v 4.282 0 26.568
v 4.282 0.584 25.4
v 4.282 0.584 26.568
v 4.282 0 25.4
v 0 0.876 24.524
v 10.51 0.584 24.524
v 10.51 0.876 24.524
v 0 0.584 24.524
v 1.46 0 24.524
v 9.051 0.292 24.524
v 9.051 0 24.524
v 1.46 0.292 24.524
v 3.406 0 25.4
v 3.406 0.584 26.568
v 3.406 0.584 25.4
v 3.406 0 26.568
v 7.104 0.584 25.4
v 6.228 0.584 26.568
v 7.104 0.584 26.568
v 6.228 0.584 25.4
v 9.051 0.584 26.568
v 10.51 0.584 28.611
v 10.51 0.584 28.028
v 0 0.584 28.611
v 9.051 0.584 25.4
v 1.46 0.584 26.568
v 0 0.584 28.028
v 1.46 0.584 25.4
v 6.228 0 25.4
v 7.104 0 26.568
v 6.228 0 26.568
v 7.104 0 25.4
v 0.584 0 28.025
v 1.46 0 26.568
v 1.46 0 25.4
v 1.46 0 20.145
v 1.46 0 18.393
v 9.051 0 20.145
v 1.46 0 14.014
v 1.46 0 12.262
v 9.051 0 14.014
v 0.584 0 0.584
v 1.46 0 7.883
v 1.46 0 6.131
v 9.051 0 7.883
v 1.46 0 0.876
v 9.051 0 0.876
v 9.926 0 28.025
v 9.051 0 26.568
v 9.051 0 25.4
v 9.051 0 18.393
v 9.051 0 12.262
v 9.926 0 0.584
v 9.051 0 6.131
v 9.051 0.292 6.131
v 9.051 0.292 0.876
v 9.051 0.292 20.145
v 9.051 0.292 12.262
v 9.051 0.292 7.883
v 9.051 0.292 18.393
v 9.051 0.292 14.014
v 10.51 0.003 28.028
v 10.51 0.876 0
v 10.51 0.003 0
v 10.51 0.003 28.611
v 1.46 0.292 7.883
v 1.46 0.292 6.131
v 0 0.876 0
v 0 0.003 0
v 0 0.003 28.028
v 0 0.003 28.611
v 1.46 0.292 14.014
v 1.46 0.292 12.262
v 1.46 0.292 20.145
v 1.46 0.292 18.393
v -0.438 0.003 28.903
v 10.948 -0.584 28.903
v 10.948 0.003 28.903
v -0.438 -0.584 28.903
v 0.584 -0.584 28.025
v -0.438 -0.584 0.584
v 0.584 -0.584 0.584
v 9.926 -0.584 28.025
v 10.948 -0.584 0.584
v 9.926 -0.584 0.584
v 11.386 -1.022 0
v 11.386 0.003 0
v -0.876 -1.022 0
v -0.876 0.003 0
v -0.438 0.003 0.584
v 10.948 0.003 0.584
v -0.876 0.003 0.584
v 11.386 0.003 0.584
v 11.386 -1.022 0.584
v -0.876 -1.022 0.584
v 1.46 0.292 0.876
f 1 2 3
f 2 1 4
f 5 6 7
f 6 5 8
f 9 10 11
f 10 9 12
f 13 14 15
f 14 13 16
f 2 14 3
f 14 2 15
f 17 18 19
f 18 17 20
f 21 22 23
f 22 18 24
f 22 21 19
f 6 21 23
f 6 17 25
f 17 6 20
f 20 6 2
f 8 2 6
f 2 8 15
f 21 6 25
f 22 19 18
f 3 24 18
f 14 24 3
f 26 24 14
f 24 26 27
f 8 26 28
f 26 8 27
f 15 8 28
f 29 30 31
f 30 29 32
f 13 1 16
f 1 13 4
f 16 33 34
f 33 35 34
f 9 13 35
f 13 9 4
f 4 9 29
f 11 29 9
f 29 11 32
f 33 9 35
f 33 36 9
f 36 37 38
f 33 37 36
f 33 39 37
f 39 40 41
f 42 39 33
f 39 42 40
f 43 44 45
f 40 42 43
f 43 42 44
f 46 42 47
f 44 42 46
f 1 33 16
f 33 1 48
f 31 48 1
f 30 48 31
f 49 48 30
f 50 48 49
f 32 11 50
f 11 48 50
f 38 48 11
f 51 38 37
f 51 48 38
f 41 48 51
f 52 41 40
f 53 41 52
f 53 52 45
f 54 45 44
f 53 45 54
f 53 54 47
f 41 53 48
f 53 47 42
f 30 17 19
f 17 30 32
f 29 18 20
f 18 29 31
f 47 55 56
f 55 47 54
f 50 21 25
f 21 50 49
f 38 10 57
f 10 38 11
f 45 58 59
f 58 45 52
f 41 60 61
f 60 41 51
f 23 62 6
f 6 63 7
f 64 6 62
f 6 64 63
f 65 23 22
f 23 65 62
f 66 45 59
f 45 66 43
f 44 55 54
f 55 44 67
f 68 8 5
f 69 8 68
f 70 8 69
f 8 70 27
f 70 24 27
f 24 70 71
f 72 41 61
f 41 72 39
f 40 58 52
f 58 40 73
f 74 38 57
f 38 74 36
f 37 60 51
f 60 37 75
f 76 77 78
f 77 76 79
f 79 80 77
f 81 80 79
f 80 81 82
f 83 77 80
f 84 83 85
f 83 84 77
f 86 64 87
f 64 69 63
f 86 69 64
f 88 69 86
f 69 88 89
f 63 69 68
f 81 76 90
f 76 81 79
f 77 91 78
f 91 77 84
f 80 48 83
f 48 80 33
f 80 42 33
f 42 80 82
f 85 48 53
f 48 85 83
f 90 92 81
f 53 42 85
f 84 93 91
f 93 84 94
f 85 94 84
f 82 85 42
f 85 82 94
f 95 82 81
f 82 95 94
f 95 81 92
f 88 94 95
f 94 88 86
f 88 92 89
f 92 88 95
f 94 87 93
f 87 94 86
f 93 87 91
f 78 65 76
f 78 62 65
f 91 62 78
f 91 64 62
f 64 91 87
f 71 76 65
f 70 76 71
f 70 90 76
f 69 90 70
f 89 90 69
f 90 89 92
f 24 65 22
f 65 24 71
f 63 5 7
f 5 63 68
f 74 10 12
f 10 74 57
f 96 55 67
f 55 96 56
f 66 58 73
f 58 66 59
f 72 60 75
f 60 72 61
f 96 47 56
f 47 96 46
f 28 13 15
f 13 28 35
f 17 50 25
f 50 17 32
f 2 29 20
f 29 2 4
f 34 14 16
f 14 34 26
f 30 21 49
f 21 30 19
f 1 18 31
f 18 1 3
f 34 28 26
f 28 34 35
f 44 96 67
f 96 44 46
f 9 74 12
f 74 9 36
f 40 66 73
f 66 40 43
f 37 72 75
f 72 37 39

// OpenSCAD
//Width of the wall opening into which the door will be inserted
opening_width=36;
//Height of the wall opening into which the door will be inserted
opening_height=96;
//Height of the transom, subtracted from the opening height
transom_height=12;
//Number of transom windows
transomwindow_quantity=3;
//Width of the boards used to make the door frame
board_width=3;
//Thickness of the boards used to make the door frame
board_thickness=2;
//Number of panels in the door
number_panels=4;
//Use this to print the window with/without the spacing to allow inserting a printed window into a separate wall
inset=1;
//The modeling scale of the .stl file.  Specifies the denominator of the scale, e.g., 1/87 for HO scale, the default.  Assumes the dimensions specified in the previous parameters are prototype, e.g. 1:1.
modeling_scale=87;
//Scales the model for printing.  Default is 25.4, the multiplier to convert decimal inches to millimeters.
printing_scale=25.4;

module doorframe(opening_width, opening_height, depth, board_width, board_thickness, inset=0) {
	difference() {
		union() {
			difference() {
				translate([0,-(opening_width+board_width)/2,0])
					cube([opening_height+board_width,opening_width+board_width,depth]);
				translate([-0.01,-(opening_width-board_thickness*2)/2,-depth*2]) //main opening
					cube([opening_height,opening_width-board_thickness*2,depth*4]);
			}
			translate([0,-(opening_width+board_width*2)/2,0])
				cube([board_thickness,opening_width+board_width*2,depth+board_width/2]);
		}
		if (inset) {  //cutouts to support inserting a printed window into a hole
			translate([-opening_height,opening_width/2,-0.01])
				cube([opening_height*3,board_width*2,depth-board_thickness]);
			translate([-opening_height,-(opening_width/2)-board_width*2,-0.01])
				cube([opening_height*3,board_width*2,depth-board_thickness]);
			translate([opening_height+board_thickness,-opening_width,-0.01])
				cube([board_width,opening_width*2,depth-board_thickness]);
		}
	}
}

module panel_door(opening_width=3*12, opening_height=8*12, transom_height=1*12, transomwindow_quantity=3, board_width=3, board_thickness=2, number_panels=4) {
	//door core:
	translate([0,board_thickness/2,0])
		cube([opening_width, board_thickness, opening_height-transom_height]);

	//horizontal door border:
	translate([0,0,0]) 
		cube([opening_width,board_thickness,board_width]);
	translate([0,0,opening_height-transom_height]) 
		cube([opening_width,board_thickness,board_width]);
	translate([0,0,opening_height-board_width-board_thickness]) 
		cube([opening_width,board_thickness,board_width+board_thickness]);

	//vertical door border
	translate([0,0,0]) 
		cube([board_width+board_thickness,board_thickness,opening_height]);
	translate([opening_width-board_width-board_thickness,0,0]) 	
		cube([board_width+board_thickness,board_thickness,opening_height]);
	
	//transom windows:
	transomwindow_width = (opening_width-board_width-board_thickness*2)/ transomwindow_quantity;
	for (i = [1:1:transomwindow_quantity])
		translate([(i*transomwindow_width)+board_thickness,0,opening_height-transom_height]) 
			cube([board_width,board_thickness,transom_height]);
	
	for (i = [1:1:number_panels-1])
		translate([0,0,((opening_height-transom_height)/number_panels)*i]) 
			cube([opening_width,board_thickness,board_width*2]);

	//door frame:
	translate([opening_width/2,board_thickness,0])
		rotate([90,-90,0])
			doorframe(opening_width, opening_height, board_thickness*2, board_width, board_thickness, inset);
}

scale(printing_scale)
	scale(1/modeling_scale)
		panel_door(opening_width=opening_width, opening_height=opening_height, transom_height=transom_height, transomwindow_quantity=transomwindow_quantity, board_width=board_width, board_thickness=board_thickness, number_panels=number_panels);
